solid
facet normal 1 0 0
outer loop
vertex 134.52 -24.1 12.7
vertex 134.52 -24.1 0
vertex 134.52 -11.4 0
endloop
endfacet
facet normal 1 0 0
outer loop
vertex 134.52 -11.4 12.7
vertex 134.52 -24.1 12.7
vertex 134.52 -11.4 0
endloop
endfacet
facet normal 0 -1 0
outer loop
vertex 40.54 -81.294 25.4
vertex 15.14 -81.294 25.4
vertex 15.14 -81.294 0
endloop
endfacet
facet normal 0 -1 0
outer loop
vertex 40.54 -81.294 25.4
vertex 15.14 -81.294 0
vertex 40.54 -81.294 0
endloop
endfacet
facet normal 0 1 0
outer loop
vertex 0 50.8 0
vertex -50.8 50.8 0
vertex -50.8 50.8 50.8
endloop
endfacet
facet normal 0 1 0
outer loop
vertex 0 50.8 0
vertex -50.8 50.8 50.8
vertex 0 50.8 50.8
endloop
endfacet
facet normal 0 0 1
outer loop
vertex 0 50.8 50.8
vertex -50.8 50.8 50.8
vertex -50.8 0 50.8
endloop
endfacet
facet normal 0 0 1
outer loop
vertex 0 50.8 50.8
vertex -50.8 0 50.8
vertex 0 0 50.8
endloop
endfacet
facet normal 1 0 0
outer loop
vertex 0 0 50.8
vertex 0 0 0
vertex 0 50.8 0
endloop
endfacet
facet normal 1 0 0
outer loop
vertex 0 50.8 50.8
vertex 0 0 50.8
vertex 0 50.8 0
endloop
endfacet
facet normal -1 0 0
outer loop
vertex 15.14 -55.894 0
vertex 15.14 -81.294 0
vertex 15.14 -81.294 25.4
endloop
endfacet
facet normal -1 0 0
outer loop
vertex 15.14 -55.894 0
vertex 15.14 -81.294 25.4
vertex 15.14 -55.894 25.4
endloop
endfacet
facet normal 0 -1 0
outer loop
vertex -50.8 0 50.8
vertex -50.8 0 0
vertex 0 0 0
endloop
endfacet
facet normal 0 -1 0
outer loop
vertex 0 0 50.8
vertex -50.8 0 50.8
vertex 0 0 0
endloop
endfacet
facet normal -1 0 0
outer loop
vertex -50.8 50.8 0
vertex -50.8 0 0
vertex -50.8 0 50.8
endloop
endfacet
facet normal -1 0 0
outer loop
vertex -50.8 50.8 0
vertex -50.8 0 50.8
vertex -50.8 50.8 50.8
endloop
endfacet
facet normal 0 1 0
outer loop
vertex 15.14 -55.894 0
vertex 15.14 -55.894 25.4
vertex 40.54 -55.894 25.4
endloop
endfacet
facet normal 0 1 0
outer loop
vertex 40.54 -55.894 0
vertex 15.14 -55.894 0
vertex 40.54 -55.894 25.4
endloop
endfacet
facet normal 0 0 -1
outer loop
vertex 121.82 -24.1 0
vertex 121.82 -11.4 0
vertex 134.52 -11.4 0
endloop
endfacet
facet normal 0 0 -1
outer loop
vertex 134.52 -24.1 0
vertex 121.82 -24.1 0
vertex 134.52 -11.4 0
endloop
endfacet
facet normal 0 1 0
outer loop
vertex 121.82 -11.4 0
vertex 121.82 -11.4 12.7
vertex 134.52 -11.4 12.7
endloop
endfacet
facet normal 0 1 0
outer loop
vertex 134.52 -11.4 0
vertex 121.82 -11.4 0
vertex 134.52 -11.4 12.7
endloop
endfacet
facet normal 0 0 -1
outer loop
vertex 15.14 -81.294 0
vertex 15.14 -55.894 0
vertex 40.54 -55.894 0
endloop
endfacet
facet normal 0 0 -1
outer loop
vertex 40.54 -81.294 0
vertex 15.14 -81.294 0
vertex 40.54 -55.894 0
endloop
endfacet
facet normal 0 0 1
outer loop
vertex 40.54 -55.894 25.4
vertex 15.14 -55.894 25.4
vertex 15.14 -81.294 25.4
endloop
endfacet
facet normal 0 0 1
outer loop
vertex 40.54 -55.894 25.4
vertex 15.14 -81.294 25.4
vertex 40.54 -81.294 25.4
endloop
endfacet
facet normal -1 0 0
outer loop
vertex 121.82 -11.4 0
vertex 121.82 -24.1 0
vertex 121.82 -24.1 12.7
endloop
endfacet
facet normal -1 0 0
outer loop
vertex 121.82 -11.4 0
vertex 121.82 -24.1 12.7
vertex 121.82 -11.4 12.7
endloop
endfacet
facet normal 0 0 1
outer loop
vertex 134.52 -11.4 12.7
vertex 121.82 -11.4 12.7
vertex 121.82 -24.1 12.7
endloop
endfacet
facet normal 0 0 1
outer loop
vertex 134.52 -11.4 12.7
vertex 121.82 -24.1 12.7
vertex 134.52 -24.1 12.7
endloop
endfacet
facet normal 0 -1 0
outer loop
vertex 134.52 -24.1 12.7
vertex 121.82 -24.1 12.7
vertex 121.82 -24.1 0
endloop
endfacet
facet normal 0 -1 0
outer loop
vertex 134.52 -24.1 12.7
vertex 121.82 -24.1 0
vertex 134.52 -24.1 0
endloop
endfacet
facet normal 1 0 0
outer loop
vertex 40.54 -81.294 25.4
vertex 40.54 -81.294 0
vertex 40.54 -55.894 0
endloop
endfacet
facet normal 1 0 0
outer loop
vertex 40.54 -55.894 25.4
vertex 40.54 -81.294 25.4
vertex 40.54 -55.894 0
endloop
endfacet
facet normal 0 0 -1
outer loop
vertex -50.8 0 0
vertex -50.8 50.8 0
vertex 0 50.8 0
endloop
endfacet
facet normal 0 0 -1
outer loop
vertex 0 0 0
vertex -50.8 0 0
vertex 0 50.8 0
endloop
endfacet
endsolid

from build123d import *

# Parameters (mm, degrees)
F0_W     = 50.8
F0_H     = 50.8
F1_DEPTH = 50.8
F2_W     = 25.4
F2_H     = 25.4
F3_DEPTH = 25.4
F4_W     = 12.7
F4_H     = 12.7
F5_DEPTH = 12.7


with BuildPart() as f1:
    # F0 (on Top) → F1 (new body)
    with BuildSketch(Plane.XY):
        with Locations((-25.4, 25.4)):
            Rectangle(F0_W, F0_H)
    extrude(amount=F1_DEPTH)


with BuildPart() as f3:
    # F2 (on Top) → F3 (new body)
    with BuildSketch(Plane.XY):
        with Locations((27.840431, -68.59422)):
            Rectangle(F2_W, F2_H)
    extrude(amount=F3_DEPTH)


with BuildPart() as f5:
    # F4 (on Top) → F5 (new body)
    with BuildSketch(Plane.XY):
        with Locations((128.169875, -17.749609)):
            Rectangle(F4_W, F4_H)
    extrude(amount=F5_DEPTH)


solid = Compound([f1.part, f3.part, f5.part])
